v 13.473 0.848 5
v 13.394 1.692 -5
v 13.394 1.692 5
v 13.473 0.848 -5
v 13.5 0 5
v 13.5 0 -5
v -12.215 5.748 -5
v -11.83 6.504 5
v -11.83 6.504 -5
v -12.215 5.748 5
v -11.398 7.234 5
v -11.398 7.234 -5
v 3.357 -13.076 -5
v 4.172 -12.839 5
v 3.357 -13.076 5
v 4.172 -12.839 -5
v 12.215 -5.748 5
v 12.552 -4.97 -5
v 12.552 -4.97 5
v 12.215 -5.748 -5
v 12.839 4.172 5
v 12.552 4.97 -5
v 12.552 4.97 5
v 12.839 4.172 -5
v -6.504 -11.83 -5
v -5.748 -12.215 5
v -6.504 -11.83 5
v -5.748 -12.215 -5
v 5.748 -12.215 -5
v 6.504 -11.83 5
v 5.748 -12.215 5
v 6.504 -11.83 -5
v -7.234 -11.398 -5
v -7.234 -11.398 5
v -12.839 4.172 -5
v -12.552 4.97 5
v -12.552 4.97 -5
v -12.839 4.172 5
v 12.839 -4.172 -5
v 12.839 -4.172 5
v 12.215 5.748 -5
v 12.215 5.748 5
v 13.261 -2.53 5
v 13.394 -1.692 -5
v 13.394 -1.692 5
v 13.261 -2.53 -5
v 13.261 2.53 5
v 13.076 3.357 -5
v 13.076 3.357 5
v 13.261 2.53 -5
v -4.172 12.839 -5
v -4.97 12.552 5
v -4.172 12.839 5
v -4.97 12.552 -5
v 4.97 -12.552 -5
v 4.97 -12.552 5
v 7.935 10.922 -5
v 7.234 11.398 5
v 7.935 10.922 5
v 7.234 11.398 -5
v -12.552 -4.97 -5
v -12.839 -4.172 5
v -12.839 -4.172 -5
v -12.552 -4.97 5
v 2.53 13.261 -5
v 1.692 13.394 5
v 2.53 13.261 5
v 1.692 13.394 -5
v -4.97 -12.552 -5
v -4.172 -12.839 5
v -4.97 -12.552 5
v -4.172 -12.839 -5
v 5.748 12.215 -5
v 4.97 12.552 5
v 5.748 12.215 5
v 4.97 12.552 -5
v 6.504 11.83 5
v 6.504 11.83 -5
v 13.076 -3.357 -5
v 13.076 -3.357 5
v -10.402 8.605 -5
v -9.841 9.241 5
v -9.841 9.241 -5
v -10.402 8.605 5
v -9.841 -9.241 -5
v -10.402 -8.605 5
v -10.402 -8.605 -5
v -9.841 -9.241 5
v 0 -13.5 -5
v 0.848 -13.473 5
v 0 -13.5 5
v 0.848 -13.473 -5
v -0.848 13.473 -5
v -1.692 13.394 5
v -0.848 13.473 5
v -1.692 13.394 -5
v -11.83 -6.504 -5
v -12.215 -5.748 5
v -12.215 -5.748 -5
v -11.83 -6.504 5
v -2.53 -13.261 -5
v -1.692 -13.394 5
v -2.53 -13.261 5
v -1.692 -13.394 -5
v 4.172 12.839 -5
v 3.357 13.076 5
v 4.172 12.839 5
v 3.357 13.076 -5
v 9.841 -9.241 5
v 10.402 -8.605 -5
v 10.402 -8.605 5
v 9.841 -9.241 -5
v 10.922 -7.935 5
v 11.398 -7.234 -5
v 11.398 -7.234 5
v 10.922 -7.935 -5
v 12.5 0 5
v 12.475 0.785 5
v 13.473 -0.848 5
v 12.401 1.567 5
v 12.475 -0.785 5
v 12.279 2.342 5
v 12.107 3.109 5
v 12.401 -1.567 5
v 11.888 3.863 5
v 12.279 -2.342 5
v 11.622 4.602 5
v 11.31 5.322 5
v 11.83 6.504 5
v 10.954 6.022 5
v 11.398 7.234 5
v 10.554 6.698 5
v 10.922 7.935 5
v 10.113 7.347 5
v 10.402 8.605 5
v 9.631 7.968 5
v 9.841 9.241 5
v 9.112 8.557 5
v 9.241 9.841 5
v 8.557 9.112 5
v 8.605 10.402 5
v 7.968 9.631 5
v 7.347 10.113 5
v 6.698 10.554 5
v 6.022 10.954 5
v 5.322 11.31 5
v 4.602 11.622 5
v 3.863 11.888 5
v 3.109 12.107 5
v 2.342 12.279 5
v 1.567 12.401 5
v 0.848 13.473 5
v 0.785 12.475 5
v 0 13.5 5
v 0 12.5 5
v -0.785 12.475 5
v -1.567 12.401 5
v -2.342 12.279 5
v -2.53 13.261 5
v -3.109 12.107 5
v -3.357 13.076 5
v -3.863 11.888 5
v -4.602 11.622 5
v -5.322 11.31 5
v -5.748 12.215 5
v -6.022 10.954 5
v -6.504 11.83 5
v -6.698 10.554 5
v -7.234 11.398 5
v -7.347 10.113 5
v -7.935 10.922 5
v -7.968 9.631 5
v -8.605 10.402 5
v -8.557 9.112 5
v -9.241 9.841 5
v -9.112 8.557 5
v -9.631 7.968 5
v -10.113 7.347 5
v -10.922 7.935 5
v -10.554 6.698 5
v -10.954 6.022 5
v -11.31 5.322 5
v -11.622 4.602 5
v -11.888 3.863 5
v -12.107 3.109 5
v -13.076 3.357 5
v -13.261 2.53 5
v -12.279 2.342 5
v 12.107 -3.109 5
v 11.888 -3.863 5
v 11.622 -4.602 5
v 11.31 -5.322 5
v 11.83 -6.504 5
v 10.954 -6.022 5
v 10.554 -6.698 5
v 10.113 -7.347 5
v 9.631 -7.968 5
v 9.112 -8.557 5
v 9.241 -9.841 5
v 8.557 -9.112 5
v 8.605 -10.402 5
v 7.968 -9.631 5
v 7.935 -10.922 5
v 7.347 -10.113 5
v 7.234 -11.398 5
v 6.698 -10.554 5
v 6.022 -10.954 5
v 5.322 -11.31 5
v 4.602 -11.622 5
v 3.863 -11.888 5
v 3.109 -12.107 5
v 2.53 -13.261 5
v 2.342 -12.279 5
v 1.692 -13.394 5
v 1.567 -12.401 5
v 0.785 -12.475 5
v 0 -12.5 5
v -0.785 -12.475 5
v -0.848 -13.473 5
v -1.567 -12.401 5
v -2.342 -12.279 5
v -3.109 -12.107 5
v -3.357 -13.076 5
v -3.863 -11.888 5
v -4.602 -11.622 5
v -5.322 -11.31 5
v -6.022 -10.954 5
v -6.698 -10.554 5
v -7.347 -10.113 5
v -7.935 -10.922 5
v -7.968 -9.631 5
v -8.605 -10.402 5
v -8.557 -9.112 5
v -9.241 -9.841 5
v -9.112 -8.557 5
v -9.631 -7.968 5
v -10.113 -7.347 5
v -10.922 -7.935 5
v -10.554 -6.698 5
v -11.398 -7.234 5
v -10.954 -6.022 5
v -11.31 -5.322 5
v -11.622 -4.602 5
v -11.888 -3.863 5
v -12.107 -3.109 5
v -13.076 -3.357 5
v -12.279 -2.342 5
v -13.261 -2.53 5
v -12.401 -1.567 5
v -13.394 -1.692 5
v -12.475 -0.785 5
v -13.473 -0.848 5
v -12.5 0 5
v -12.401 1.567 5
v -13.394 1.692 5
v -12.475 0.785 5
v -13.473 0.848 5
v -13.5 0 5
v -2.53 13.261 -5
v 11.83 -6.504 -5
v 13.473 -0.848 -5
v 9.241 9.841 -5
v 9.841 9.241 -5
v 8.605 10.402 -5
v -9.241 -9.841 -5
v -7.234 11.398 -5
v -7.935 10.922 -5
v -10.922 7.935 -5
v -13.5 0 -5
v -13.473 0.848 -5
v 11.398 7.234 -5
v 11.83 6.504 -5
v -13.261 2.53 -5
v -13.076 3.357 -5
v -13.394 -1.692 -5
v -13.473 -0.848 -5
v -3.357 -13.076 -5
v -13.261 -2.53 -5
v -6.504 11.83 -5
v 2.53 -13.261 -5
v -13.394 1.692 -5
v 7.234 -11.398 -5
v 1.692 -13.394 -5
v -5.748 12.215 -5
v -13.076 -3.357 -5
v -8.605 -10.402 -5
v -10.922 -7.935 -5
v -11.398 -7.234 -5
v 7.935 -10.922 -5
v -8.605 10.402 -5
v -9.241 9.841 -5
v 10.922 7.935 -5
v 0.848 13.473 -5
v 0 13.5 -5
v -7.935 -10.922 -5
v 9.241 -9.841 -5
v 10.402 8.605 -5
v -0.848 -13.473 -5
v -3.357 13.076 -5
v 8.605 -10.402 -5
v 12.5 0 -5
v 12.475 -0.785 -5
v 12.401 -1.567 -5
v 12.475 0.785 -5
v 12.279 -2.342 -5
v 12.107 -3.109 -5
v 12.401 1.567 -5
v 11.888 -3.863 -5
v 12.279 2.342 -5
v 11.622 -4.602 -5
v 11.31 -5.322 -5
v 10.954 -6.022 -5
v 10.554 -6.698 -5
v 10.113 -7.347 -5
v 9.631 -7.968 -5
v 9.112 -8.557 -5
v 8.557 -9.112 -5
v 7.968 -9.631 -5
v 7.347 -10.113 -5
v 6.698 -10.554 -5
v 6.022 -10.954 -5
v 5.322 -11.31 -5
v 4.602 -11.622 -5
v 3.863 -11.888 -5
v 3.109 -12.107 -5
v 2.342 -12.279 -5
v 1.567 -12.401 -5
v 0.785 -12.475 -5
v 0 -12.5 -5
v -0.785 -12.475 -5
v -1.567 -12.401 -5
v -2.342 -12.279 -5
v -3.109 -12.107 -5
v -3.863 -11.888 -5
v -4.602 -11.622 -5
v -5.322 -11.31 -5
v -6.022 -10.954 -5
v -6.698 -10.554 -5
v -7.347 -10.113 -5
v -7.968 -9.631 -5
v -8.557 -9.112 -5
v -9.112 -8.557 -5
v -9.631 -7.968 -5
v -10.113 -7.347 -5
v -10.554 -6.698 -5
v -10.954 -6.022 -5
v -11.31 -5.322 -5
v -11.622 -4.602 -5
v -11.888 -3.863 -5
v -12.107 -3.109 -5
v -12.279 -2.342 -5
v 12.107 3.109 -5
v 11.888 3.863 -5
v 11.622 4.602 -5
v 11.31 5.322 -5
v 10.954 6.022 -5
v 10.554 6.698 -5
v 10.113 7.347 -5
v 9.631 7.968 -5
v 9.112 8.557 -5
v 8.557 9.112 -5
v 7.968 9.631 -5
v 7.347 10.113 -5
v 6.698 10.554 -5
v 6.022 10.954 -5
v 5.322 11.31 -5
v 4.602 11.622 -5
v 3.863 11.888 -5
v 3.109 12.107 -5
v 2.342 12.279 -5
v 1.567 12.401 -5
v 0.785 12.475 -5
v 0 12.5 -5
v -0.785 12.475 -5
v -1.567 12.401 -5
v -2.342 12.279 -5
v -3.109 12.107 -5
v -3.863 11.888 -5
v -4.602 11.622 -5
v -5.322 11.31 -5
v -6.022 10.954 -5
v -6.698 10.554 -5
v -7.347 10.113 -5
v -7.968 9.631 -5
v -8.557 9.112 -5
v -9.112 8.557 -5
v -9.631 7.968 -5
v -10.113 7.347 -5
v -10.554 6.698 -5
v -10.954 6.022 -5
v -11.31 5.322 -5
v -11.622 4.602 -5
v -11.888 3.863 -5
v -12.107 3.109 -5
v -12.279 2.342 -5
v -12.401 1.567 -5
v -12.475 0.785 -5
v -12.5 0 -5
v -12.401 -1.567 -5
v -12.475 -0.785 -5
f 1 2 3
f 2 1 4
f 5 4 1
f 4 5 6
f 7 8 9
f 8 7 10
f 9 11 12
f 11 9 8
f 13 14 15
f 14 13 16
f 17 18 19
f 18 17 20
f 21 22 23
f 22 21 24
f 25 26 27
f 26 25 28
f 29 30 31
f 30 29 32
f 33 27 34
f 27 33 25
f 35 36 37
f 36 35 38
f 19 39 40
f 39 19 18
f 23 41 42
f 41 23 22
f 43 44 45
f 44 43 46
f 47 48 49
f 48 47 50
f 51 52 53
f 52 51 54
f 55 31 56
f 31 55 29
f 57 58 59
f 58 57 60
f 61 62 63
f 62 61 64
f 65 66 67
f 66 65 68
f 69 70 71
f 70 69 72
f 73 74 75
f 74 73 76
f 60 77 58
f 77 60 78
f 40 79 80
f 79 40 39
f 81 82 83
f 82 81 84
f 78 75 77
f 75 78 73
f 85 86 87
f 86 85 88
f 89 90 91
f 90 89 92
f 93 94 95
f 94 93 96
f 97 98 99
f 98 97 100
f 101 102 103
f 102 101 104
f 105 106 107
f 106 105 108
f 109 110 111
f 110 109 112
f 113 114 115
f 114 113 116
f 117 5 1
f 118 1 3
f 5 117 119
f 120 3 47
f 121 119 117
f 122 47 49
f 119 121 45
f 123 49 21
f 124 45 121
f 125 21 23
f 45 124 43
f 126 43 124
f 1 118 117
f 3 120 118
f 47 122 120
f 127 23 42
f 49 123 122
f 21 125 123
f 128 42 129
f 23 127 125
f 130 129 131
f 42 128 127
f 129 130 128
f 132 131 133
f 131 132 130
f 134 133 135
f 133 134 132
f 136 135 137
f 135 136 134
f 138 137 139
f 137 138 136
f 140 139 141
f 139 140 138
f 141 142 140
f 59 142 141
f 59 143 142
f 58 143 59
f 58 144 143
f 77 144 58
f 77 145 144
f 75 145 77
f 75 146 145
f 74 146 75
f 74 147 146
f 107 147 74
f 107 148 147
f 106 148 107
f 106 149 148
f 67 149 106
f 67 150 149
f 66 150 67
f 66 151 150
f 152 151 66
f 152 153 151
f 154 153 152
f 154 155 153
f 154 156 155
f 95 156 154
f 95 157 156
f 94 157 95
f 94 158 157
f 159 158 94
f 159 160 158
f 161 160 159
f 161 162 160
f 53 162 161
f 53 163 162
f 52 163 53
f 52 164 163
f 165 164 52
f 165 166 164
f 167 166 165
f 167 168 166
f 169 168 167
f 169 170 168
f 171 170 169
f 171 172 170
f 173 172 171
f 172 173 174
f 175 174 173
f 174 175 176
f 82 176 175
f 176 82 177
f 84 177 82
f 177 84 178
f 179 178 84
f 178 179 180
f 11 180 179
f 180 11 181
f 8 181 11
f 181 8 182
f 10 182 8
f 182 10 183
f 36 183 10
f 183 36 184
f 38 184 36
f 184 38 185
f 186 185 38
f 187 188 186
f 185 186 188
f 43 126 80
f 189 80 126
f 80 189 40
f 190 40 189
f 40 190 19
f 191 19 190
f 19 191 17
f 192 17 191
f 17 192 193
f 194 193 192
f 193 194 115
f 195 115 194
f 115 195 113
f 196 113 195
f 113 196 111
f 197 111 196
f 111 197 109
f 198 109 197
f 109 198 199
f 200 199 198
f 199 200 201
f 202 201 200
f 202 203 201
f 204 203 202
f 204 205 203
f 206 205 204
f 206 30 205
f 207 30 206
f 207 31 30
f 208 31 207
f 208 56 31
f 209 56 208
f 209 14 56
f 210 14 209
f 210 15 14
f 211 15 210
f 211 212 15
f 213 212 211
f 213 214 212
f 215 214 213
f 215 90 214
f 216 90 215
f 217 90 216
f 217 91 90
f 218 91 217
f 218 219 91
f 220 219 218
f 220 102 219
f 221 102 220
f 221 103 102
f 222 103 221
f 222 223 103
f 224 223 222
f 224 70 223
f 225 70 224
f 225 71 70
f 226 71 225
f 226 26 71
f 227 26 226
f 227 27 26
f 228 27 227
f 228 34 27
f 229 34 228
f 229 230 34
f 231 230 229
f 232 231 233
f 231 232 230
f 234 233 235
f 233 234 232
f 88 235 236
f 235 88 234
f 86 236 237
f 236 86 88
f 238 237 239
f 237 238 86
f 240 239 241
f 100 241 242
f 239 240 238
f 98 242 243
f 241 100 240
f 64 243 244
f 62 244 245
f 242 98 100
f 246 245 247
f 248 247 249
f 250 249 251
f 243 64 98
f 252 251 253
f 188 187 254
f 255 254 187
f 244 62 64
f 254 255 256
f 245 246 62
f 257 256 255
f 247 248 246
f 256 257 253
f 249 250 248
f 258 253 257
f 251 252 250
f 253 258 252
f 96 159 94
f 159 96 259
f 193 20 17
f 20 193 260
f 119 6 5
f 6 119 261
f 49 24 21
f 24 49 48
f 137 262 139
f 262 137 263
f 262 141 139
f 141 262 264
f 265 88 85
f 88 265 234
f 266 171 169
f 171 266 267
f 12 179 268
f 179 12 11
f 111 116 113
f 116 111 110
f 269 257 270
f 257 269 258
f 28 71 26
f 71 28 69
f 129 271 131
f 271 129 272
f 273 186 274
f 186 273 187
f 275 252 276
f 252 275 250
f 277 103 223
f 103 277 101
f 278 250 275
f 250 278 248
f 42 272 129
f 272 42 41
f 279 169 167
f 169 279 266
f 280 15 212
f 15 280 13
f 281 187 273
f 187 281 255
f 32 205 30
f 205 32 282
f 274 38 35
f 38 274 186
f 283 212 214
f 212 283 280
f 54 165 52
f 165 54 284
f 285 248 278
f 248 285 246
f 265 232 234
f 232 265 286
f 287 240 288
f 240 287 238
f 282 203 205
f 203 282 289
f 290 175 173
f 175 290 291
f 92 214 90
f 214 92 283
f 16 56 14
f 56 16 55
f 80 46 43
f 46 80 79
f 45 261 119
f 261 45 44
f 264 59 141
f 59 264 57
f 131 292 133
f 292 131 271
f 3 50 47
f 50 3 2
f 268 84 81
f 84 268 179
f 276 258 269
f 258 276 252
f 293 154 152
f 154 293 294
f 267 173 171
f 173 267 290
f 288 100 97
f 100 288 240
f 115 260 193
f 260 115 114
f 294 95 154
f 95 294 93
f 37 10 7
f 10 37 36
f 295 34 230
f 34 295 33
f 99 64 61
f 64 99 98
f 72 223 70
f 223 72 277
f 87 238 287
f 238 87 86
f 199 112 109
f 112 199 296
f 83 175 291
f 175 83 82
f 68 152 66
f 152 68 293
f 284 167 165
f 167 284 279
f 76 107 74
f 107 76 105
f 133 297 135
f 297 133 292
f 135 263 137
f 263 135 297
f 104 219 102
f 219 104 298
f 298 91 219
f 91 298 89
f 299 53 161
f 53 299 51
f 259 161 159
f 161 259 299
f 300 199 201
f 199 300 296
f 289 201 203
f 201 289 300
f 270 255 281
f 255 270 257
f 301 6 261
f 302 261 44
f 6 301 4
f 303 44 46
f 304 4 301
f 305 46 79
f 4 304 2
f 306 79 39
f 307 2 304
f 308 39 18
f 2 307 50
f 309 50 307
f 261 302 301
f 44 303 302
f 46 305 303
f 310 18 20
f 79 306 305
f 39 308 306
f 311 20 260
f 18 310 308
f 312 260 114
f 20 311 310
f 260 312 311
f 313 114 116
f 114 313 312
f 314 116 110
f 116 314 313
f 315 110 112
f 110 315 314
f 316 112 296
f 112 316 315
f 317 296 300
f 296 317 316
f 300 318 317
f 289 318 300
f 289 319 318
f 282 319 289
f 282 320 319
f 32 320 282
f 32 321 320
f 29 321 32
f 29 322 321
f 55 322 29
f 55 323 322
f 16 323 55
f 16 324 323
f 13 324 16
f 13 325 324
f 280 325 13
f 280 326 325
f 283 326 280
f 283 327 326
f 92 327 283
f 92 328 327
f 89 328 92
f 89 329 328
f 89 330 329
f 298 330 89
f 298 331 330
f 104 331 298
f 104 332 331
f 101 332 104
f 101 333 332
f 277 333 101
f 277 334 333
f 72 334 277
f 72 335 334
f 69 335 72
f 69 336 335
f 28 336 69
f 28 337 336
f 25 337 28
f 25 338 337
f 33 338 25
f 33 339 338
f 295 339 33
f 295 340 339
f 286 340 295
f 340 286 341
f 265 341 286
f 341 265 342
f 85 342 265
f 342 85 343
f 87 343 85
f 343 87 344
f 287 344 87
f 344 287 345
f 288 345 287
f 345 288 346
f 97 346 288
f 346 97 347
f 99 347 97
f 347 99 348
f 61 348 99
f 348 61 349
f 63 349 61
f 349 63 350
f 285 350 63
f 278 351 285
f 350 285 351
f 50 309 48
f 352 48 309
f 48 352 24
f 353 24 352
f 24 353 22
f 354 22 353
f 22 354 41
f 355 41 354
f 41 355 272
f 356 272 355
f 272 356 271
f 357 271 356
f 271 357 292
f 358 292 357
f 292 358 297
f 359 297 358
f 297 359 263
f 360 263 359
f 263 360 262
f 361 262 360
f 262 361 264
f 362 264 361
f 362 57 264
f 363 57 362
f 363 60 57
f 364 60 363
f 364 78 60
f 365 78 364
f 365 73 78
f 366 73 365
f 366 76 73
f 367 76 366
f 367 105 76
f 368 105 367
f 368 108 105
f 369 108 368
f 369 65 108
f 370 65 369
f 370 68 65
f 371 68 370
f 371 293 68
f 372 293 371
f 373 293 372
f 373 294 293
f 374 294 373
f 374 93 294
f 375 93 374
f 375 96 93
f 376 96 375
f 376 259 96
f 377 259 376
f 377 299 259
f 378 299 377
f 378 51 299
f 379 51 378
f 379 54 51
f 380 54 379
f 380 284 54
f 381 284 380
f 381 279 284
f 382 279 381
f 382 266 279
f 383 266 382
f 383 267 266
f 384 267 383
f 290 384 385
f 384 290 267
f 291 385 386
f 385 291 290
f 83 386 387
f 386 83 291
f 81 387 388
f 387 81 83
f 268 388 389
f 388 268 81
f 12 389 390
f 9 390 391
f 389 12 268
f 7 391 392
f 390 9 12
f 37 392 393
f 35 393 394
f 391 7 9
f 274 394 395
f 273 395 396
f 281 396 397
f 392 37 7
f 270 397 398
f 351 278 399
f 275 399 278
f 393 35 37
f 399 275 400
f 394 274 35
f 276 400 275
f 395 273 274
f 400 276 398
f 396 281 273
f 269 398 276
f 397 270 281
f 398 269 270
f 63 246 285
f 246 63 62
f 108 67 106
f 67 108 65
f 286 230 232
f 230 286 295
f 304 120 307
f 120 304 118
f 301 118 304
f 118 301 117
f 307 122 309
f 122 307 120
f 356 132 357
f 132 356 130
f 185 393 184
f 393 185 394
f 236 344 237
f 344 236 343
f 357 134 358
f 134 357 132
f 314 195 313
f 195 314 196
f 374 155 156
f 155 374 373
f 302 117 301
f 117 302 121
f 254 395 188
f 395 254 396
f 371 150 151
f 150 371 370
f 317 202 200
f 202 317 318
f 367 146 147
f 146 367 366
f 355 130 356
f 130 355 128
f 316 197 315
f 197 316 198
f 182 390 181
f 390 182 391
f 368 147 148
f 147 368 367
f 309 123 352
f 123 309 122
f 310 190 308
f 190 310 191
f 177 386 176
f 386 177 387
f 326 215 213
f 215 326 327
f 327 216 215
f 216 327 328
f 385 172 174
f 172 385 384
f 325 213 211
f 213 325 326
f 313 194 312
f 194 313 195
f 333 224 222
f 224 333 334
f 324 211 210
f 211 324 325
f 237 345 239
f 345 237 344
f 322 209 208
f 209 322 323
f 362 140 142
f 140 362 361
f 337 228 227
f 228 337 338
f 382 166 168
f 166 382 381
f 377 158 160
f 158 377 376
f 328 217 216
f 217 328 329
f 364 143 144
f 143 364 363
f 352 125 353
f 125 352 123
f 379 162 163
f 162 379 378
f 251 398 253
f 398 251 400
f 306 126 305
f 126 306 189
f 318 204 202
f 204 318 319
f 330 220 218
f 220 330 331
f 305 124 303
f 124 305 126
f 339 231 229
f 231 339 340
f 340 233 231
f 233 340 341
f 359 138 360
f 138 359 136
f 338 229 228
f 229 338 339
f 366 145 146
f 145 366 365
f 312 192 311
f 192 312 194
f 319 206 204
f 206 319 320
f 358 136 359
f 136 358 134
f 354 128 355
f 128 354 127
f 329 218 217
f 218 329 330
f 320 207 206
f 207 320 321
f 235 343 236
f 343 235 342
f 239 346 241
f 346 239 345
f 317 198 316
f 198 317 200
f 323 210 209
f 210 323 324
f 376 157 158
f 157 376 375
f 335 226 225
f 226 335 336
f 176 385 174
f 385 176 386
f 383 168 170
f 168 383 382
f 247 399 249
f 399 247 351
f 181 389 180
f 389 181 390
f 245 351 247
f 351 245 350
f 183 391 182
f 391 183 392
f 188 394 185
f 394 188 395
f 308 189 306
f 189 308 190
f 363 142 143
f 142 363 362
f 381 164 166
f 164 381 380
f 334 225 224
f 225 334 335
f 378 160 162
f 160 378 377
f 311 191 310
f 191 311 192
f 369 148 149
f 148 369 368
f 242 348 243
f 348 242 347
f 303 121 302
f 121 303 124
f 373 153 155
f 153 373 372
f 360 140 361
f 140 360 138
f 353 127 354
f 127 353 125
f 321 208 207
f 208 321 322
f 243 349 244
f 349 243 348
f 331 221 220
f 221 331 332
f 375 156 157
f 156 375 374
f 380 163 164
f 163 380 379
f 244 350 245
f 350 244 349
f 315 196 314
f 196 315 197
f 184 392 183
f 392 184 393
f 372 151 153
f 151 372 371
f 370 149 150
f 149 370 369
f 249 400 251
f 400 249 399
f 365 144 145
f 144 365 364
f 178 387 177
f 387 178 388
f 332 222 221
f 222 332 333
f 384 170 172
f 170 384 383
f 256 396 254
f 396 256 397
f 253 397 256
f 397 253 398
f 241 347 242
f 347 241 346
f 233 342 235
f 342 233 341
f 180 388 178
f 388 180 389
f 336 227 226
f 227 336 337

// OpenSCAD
$fn=20;

/*
    PIECE
*/

module vacuum_test() {
	$fn=100;
	
	vacuum_diameter_inner = 25+2;
	vacuum_diameter_outer = 24;
	
	color([0.1, 0.1, 0.1])
	translate([0, 0, 0])
	difference() {
		cylinder(r=(vacuum_diameter_inner / 2), h=10, center=true);
		cylinder(r=(vacuum_diameter_inner / 2) - 1, h=11, center=true);
	}
	
//	cylinder(r1=(vacuum_diameter_inner / 2), r2 = (vacuum_diameter_inner / 2) - 1, h=10, center=true);
	
	
}
// vacuum_test
vacuum_test();
